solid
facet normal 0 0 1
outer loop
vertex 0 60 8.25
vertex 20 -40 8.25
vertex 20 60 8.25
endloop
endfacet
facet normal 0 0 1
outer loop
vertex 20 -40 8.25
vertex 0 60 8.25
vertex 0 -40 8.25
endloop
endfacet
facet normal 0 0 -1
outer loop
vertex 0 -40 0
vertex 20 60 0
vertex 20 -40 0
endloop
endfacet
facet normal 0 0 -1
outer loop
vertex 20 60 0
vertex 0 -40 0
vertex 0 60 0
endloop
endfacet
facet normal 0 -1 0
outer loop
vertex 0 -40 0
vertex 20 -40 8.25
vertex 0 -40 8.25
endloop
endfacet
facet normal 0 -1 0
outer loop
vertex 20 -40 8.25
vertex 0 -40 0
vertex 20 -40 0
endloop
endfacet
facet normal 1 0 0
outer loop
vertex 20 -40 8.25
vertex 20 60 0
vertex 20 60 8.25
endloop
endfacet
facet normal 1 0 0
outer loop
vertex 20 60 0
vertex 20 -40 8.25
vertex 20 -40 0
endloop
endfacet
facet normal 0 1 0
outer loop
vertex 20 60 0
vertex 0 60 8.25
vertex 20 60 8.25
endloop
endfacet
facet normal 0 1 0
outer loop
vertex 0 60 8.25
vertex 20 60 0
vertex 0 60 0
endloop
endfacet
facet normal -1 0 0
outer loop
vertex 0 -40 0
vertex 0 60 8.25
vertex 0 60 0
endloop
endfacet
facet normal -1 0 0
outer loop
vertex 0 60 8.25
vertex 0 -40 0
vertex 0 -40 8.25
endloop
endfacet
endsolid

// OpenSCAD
// shrink factor for the legs
leg_shrink = 0.7; //[0.3:0.05:0.9]

// has rock under the feet like a sidewalk
has_rock = true;

/* [resolution] */
// resolution
$fn = 10;

/* [Animation] */
// rotating animation
animation_rotation = false;

/* [Hidden] */
is_animated = animation_rotation;
shrink = is_animated ? ($t * 0.6 + 0.3) : leg_shrink;
$vpt = is_animated ? [0, 0, 50] : $vpt;
$vpr = is_animated ? [70, 0, 20] : $vpr; // animation rotate around the object
$vpd = is_animated ? 400 : $vpd;

dahut(shrink, has_rock);

module dahut(leg_shrink, has_rock) {
  dahut_leg(leg_shrink, has_rock);
  dahut_body();
}

module dahut_leg(shrink, has_rock) {
  translate([0, 0, 27.5 * (1 - shrink)]) {
    scale([1, 1, shrink]) {
      intersection() {
        dahut_base();
        translate([0, -40, 0])
          cube([20, 100, 27.5]);
      }
    }
  }
  if (has_rock) {
    color("green")
      translate([0, -40, 0])
        cube([20, 100, 27.5 * (1 - shrink)]);
  }
}

module dahut_body() {
  difference() {
    dahut_base();
    translate([0, -40, 0])
      cube([20, 100, 27.5]);
  }
}

module dahut_base() {
  difference() {
    import("goat.3mf");
    translate([0, 0, -50])
      cube(100, center = true);
  }
}
